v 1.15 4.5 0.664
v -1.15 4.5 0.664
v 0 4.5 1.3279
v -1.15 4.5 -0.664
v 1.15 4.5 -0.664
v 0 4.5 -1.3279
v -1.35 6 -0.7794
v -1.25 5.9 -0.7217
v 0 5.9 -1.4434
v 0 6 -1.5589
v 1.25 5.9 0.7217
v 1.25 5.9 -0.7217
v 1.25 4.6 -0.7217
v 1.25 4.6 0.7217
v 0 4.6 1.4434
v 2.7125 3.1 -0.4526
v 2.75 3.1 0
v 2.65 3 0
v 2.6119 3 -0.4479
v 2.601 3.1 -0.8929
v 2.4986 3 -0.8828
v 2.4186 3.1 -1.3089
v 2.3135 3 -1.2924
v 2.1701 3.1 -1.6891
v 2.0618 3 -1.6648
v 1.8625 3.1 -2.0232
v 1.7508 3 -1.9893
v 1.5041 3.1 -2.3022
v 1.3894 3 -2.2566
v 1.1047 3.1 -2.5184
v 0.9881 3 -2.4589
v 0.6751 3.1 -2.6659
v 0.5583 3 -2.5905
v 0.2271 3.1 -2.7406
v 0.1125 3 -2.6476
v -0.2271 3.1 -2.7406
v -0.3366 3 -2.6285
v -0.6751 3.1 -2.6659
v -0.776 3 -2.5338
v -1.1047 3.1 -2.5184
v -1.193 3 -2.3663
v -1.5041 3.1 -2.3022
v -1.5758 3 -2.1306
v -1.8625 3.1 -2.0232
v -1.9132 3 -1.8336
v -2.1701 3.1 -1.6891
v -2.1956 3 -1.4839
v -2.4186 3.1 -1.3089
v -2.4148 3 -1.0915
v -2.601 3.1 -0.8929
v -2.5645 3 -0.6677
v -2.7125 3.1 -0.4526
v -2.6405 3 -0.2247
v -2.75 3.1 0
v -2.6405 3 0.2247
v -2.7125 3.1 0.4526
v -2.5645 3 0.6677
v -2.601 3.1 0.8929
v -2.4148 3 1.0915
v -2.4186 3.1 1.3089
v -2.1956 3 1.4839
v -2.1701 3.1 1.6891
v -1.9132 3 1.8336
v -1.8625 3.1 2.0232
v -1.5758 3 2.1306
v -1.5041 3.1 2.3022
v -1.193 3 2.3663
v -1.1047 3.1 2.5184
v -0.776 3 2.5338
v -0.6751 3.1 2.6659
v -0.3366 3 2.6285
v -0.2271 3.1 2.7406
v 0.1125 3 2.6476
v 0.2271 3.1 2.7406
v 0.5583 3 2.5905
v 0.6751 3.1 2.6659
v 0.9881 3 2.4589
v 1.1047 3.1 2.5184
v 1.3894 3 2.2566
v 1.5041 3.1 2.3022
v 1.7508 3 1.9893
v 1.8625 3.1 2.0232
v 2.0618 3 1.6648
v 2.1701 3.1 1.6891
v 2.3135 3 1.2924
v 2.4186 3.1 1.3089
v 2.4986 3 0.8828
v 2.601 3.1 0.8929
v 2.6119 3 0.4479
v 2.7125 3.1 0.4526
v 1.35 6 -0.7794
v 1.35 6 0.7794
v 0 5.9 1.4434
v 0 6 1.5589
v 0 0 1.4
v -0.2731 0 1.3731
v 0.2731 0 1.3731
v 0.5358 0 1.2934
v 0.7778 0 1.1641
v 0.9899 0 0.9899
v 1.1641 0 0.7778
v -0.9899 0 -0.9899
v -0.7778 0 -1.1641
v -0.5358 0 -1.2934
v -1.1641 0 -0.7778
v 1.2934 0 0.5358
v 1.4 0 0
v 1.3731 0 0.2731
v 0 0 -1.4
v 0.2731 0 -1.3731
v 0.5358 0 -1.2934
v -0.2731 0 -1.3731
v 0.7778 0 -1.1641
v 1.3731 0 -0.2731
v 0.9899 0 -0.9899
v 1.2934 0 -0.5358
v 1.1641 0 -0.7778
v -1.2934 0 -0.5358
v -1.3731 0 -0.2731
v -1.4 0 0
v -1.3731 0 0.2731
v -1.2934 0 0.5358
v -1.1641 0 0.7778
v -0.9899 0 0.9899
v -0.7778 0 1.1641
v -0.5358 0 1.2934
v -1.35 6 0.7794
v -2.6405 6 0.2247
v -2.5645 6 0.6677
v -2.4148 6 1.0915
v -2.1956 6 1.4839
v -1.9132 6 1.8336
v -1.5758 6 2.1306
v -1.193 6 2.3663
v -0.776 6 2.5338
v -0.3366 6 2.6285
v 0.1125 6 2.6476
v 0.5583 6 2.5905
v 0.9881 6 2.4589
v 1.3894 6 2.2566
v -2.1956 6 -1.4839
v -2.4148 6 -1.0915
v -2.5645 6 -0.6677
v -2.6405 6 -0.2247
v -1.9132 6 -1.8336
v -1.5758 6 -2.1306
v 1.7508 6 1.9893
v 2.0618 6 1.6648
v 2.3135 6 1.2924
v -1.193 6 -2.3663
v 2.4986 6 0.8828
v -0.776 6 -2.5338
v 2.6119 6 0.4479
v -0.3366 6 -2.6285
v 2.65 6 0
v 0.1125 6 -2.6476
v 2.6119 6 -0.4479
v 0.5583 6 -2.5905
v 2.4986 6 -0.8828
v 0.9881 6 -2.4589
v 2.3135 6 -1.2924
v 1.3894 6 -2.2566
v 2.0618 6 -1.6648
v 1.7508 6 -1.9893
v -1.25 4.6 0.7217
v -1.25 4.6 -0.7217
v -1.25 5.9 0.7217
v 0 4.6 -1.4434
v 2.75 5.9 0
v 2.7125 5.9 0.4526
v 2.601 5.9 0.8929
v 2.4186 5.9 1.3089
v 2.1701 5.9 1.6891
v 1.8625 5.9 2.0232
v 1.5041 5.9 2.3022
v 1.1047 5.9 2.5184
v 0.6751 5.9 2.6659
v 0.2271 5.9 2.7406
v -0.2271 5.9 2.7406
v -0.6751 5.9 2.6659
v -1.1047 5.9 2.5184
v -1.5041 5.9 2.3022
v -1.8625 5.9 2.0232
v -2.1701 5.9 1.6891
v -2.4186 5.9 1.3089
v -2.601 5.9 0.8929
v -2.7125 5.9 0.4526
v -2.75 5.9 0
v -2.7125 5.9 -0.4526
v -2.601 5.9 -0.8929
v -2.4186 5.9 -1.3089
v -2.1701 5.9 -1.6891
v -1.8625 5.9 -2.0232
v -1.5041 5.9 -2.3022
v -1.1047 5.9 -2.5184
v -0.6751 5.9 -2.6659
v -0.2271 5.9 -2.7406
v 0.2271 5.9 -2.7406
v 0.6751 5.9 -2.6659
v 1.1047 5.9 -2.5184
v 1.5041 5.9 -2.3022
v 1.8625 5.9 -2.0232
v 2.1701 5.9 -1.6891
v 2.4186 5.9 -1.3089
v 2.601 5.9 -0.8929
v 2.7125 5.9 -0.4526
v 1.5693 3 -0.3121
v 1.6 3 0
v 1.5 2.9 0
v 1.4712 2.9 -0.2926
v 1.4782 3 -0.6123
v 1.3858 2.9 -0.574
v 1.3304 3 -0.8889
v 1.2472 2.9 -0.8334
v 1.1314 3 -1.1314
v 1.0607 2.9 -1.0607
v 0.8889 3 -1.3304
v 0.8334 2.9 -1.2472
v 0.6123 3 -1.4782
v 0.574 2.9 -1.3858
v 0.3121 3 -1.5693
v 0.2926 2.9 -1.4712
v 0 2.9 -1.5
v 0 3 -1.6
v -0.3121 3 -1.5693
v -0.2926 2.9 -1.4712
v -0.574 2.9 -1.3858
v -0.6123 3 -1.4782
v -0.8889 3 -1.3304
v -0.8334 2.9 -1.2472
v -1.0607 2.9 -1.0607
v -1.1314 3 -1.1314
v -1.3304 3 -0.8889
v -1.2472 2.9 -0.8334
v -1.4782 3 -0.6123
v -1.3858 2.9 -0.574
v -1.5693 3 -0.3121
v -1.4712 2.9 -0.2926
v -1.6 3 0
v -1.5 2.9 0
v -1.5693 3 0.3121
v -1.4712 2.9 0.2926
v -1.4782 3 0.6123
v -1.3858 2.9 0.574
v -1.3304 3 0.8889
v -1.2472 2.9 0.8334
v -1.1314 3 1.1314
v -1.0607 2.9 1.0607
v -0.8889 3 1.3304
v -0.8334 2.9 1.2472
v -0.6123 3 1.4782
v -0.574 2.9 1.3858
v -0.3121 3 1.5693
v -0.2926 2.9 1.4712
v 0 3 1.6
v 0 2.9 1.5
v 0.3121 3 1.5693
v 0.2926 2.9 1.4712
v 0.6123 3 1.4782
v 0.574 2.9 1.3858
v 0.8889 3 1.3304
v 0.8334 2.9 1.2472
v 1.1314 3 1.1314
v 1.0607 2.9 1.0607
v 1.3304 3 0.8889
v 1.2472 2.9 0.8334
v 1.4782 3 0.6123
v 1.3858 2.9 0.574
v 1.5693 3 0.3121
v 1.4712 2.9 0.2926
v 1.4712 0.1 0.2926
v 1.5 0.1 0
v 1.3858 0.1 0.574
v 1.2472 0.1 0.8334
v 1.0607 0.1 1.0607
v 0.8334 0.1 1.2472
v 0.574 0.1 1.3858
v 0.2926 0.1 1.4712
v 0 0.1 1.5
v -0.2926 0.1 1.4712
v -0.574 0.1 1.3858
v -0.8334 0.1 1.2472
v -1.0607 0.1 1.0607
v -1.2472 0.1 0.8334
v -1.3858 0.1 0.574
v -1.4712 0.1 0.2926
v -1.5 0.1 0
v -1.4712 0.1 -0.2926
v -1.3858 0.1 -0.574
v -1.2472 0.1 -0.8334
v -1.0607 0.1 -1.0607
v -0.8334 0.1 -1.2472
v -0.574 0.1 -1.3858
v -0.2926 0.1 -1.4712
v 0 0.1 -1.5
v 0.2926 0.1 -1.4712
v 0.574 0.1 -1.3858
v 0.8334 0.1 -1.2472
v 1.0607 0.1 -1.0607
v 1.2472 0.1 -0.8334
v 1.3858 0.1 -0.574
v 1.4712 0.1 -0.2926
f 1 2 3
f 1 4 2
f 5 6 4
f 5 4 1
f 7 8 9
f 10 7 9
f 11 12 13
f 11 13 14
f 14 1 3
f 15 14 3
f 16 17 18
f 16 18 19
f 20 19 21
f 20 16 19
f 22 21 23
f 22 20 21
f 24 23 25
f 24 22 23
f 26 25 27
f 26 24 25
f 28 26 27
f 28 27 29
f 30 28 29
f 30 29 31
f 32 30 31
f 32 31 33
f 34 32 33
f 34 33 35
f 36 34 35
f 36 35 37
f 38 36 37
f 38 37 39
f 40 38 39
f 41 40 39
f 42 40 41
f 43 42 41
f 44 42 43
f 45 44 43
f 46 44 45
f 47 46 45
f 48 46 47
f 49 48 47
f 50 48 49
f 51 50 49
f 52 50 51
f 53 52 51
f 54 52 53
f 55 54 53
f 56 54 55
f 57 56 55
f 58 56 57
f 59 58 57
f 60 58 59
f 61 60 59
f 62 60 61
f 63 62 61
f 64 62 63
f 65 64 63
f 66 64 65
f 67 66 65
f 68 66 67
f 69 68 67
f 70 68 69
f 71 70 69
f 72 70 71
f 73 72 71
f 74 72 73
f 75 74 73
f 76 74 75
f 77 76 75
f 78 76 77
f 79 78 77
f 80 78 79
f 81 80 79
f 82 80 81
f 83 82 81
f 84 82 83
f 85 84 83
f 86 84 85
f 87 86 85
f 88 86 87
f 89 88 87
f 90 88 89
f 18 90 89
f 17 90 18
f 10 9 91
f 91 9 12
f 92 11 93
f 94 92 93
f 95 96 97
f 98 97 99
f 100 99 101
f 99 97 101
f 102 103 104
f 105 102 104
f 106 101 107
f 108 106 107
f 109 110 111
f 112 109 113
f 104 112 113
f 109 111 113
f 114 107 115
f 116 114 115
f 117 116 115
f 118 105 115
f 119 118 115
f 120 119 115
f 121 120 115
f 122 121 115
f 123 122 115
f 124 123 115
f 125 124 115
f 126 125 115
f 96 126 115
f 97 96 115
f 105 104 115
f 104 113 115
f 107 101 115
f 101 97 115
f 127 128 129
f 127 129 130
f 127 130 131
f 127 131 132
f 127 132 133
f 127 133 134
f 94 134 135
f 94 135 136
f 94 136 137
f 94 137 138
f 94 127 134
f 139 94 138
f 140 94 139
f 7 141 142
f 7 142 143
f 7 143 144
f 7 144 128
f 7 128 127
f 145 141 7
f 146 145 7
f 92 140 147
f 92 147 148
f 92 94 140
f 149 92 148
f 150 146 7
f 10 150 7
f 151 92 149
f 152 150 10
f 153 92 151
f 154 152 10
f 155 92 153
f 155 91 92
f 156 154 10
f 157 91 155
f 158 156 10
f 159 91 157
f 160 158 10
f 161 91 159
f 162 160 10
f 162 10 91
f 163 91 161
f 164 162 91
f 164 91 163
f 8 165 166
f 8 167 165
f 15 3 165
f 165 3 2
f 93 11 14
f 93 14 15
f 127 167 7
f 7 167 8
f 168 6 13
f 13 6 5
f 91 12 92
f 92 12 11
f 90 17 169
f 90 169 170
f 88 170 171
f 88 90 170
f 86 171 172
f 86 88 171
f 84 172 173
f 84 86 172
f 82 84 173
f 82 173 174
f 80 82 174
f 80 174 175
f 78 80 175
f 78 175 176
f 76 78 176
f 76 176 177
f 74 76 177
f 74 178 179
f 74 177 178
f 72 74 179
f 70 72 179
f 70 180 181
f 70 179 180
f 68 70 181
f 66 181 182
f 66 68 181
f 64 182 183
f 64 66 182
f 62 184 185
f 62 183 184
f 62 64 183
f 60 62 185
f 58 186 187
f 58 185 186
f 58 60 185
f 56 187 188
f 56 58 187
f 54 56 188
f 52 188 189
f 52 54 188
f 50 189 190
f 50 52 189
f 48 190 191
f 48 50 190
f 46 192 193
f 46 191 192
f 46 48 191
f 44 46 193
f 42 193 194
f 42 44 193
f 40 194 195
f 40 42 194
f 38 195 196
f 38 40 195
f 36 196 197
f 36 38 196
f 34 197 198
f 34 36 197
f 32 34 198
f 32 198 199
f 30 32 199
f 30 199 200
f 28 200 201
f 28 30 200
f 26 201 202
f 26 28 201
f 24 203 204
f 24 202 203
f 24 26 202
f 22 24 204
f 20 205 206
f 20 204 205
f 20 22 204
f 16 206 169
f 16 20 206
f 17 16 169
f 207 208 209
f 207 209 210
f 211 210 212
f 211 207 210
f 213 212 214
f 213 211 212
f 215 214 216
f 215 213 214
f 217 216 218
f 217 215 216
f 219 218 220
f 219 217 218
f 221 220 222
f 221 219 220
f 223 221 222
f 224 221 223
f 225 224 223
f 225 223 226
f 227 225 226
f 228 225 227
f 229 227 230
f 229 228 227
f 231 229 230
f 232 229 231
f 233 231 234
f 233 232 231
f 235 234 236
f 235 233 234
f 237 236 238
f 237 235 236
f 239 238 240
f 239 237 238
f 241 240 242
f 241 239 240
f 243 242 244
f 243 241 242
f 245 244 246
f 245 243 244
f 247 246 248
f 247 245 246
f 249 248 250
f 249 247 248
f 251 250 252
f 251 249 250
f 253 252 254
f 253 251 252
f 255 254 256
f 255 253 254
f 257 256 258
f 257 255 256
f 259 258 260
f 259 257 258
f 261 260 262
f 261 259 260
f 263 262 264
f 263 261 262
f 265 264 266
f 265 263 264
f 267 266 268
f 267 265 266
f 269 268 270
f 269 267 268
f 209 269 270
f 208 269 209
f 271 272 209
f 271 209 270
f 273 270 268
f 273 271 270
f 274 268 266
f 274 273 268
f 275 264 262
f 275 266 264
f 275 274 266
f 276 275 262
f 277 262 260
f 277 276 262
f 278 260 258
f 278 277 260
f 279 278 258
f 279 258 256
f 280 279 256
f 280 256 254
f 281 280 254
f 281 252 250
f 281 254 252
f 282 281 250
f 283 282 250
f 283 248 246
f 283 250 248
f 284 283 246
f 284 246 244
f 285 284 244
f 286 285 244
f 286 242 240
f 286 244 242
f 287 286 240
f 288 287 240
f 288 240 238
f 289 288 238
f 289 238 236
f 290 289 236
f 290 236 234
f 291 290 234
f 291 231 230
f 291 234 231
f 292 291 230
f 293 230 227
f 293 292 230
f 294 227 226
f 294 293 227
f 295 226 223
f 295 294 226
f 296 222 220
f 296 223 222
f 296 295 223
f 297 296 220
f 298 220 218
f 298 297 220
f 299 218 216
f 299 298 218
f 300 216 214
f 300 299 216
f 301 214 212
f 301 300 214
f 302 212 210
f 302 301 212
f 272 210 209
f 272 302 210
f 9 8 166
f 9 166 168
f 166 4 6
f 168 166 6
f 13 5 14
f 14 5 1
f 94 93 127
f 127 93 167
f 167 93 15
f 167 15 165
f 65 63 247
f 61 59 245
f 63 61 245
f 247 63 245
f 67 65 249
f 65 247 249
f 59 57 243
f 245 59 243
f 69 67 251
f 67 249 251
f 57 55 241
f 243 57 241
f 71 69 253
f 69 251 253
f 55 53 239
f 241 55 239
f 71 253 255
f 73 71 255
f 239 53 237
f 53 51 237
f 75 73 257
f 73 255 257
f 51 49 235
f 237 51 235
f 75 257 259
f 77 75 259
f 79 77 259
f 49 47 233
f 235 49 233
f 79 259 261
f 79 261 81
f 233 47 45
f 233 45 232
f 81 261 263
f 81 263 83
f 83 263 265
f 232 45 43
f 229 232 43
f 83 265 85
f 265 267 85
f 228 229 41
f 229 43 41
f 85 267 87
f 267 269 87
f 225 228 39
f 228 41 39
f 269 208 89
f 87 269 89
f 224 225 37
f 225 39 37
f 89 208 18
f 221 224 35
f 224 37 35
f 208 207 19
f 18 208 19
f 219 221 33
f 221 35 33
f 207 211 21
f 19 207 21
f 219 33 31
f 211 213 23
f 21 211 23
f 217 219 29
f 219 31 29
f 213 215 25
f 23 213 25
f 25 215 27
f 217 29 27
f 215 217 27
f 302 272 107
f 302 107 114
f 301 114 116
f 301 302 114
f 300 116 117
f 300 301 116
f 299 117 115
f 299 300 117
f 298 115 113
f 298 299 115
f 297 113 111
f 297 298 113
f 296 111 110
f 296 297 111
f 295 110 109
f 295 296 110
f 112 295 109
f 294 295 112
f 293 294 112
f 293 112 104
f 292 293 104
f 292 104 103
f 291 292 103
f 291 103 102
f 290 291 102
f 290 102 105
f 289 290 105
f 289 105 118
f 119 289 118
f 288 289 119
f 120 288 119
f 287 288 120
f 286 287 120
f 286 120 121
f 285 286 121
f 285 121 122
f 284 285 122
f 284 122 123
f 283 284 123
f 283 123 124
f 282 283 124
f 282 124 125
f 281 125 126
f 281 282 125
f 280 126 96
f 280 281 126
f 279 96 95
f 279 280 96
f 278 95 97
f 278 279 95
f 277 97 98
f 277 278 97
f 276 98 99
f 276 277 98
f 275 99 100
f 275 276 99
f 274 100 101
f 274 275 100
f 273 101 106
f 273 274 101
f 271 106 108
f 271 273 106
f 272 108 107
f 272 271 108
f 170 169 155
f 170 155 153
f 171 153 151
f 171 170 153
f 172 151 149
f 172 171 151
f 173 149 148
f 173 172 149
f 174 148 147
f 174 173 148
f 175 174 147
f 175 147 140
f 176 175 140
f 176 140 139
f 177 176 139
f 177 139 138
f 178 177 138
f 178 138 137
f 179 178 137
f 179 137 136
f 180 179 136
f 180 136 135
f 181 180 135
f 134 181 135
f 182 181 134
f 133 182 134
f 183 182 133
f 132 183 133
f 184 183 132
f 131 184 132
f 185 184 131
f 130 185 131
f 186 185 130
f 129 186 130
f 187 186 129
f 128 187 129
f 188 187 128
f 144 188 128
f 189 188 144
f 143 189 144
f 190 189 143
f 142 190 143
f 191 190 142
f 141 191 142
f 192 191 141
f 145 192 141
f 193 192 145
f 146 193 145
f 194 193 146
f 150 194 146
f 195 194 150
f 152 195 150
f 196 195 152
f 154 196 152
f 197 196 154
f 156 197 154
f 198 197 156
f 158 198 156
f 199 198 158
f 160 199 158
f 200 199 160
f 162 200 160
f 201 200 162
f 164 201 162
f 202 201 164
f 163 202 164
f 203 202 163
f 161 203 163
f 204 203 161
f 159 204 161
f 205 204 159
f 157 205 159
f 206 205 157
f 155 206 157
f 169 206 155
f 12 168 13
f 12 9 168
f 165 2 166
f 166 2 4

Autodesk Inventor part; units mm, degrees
ref_plane "YZ Plane" through (0, 0, 0) normal (1, 0, 0) x (0, 1, 0)
ref_plane "XZ Plane" through (0, 0, 0) normal (0, 1, 0) x (-1, 0, 0)
ref_plane "XY Plane" through (0, 0, 0) normal (0, 0, 1) x (1, 0, 0)
sketch "Sketch1" plane through (0, 0, 0) normal (0, 0, 1) x (1, 0, 0)
  line L0 (0, 6) -> (2.75, 6)
  line L1 (2.75, 6) -> (2.75, 3)
  line L2 (2.75, 3) -> (1.5, 3)
  line L3 (1.5, 3) -> (1.5, 0)
  line L4 (1.5, 0) -> (0, 0)
  line L5 (0, 0) -> (0, 6)
  dimension "d0" = 2.75
  dimension "d1" = 3
  dimension "d2" = 3
  dimension "d3" = 1.5
revolve "Revolution1" add sketch "Sketch1" angle 360 about axis through (0, 0, 0) along (0, 1, 0)
thread "Thread1" size "M3x0.5" class "6g" standard "ANSI Metric M Profile" full length
sketch "Sketch3" plane through (0, 6, 0) normal (0, 1, 0) x (1, 0, 0)
  line L0 (1.25, -0.7217) -> (0, -1.4434)
  line L1 (0, -1.4434) -> (-1.25, -0.7217)
  line L2 (-1.25, -0.7217) -> (-1.25, 0.7217)
  line L3 (-1.25, 0.7217) -> (0, 1.4434)
  line L4 (0, 1.4434) -> (1.25, 0.7217)
  line L5 (1.25, 0.7217) -> (1.25, -0.7217)
  point P0 (0, 0)
  point P1 (0, 0)
  dimension "d13" = 2.5
extrude "Extrusion2" cut sketch "Sketch3" against normal blind 1.5
chamfer "Chamfer2" distance 0.1 angle 45 16 edges at (0.625, 6, 1.0825) (1.25, 6, 0) (1.25, 4.5, 0) (0.625, 6, -1.0825) (0.625, 4.5, -1.0825) (-0.625, 6, -1.0825) (-0.625, 4.5, -1.0825) (-1.25, 4.5, 0) (-1.25, 6, 0) (-0.625, 4.5, 1.0825) (-0.625, 6, 1.0825) (0.625, 4.5, 1.0825) (-2.75, 6, 0) (-2.75, 3, 0) (-1.5, 3, 0) (-1.5, 0, 0)
properties part number "M3 X 3"
